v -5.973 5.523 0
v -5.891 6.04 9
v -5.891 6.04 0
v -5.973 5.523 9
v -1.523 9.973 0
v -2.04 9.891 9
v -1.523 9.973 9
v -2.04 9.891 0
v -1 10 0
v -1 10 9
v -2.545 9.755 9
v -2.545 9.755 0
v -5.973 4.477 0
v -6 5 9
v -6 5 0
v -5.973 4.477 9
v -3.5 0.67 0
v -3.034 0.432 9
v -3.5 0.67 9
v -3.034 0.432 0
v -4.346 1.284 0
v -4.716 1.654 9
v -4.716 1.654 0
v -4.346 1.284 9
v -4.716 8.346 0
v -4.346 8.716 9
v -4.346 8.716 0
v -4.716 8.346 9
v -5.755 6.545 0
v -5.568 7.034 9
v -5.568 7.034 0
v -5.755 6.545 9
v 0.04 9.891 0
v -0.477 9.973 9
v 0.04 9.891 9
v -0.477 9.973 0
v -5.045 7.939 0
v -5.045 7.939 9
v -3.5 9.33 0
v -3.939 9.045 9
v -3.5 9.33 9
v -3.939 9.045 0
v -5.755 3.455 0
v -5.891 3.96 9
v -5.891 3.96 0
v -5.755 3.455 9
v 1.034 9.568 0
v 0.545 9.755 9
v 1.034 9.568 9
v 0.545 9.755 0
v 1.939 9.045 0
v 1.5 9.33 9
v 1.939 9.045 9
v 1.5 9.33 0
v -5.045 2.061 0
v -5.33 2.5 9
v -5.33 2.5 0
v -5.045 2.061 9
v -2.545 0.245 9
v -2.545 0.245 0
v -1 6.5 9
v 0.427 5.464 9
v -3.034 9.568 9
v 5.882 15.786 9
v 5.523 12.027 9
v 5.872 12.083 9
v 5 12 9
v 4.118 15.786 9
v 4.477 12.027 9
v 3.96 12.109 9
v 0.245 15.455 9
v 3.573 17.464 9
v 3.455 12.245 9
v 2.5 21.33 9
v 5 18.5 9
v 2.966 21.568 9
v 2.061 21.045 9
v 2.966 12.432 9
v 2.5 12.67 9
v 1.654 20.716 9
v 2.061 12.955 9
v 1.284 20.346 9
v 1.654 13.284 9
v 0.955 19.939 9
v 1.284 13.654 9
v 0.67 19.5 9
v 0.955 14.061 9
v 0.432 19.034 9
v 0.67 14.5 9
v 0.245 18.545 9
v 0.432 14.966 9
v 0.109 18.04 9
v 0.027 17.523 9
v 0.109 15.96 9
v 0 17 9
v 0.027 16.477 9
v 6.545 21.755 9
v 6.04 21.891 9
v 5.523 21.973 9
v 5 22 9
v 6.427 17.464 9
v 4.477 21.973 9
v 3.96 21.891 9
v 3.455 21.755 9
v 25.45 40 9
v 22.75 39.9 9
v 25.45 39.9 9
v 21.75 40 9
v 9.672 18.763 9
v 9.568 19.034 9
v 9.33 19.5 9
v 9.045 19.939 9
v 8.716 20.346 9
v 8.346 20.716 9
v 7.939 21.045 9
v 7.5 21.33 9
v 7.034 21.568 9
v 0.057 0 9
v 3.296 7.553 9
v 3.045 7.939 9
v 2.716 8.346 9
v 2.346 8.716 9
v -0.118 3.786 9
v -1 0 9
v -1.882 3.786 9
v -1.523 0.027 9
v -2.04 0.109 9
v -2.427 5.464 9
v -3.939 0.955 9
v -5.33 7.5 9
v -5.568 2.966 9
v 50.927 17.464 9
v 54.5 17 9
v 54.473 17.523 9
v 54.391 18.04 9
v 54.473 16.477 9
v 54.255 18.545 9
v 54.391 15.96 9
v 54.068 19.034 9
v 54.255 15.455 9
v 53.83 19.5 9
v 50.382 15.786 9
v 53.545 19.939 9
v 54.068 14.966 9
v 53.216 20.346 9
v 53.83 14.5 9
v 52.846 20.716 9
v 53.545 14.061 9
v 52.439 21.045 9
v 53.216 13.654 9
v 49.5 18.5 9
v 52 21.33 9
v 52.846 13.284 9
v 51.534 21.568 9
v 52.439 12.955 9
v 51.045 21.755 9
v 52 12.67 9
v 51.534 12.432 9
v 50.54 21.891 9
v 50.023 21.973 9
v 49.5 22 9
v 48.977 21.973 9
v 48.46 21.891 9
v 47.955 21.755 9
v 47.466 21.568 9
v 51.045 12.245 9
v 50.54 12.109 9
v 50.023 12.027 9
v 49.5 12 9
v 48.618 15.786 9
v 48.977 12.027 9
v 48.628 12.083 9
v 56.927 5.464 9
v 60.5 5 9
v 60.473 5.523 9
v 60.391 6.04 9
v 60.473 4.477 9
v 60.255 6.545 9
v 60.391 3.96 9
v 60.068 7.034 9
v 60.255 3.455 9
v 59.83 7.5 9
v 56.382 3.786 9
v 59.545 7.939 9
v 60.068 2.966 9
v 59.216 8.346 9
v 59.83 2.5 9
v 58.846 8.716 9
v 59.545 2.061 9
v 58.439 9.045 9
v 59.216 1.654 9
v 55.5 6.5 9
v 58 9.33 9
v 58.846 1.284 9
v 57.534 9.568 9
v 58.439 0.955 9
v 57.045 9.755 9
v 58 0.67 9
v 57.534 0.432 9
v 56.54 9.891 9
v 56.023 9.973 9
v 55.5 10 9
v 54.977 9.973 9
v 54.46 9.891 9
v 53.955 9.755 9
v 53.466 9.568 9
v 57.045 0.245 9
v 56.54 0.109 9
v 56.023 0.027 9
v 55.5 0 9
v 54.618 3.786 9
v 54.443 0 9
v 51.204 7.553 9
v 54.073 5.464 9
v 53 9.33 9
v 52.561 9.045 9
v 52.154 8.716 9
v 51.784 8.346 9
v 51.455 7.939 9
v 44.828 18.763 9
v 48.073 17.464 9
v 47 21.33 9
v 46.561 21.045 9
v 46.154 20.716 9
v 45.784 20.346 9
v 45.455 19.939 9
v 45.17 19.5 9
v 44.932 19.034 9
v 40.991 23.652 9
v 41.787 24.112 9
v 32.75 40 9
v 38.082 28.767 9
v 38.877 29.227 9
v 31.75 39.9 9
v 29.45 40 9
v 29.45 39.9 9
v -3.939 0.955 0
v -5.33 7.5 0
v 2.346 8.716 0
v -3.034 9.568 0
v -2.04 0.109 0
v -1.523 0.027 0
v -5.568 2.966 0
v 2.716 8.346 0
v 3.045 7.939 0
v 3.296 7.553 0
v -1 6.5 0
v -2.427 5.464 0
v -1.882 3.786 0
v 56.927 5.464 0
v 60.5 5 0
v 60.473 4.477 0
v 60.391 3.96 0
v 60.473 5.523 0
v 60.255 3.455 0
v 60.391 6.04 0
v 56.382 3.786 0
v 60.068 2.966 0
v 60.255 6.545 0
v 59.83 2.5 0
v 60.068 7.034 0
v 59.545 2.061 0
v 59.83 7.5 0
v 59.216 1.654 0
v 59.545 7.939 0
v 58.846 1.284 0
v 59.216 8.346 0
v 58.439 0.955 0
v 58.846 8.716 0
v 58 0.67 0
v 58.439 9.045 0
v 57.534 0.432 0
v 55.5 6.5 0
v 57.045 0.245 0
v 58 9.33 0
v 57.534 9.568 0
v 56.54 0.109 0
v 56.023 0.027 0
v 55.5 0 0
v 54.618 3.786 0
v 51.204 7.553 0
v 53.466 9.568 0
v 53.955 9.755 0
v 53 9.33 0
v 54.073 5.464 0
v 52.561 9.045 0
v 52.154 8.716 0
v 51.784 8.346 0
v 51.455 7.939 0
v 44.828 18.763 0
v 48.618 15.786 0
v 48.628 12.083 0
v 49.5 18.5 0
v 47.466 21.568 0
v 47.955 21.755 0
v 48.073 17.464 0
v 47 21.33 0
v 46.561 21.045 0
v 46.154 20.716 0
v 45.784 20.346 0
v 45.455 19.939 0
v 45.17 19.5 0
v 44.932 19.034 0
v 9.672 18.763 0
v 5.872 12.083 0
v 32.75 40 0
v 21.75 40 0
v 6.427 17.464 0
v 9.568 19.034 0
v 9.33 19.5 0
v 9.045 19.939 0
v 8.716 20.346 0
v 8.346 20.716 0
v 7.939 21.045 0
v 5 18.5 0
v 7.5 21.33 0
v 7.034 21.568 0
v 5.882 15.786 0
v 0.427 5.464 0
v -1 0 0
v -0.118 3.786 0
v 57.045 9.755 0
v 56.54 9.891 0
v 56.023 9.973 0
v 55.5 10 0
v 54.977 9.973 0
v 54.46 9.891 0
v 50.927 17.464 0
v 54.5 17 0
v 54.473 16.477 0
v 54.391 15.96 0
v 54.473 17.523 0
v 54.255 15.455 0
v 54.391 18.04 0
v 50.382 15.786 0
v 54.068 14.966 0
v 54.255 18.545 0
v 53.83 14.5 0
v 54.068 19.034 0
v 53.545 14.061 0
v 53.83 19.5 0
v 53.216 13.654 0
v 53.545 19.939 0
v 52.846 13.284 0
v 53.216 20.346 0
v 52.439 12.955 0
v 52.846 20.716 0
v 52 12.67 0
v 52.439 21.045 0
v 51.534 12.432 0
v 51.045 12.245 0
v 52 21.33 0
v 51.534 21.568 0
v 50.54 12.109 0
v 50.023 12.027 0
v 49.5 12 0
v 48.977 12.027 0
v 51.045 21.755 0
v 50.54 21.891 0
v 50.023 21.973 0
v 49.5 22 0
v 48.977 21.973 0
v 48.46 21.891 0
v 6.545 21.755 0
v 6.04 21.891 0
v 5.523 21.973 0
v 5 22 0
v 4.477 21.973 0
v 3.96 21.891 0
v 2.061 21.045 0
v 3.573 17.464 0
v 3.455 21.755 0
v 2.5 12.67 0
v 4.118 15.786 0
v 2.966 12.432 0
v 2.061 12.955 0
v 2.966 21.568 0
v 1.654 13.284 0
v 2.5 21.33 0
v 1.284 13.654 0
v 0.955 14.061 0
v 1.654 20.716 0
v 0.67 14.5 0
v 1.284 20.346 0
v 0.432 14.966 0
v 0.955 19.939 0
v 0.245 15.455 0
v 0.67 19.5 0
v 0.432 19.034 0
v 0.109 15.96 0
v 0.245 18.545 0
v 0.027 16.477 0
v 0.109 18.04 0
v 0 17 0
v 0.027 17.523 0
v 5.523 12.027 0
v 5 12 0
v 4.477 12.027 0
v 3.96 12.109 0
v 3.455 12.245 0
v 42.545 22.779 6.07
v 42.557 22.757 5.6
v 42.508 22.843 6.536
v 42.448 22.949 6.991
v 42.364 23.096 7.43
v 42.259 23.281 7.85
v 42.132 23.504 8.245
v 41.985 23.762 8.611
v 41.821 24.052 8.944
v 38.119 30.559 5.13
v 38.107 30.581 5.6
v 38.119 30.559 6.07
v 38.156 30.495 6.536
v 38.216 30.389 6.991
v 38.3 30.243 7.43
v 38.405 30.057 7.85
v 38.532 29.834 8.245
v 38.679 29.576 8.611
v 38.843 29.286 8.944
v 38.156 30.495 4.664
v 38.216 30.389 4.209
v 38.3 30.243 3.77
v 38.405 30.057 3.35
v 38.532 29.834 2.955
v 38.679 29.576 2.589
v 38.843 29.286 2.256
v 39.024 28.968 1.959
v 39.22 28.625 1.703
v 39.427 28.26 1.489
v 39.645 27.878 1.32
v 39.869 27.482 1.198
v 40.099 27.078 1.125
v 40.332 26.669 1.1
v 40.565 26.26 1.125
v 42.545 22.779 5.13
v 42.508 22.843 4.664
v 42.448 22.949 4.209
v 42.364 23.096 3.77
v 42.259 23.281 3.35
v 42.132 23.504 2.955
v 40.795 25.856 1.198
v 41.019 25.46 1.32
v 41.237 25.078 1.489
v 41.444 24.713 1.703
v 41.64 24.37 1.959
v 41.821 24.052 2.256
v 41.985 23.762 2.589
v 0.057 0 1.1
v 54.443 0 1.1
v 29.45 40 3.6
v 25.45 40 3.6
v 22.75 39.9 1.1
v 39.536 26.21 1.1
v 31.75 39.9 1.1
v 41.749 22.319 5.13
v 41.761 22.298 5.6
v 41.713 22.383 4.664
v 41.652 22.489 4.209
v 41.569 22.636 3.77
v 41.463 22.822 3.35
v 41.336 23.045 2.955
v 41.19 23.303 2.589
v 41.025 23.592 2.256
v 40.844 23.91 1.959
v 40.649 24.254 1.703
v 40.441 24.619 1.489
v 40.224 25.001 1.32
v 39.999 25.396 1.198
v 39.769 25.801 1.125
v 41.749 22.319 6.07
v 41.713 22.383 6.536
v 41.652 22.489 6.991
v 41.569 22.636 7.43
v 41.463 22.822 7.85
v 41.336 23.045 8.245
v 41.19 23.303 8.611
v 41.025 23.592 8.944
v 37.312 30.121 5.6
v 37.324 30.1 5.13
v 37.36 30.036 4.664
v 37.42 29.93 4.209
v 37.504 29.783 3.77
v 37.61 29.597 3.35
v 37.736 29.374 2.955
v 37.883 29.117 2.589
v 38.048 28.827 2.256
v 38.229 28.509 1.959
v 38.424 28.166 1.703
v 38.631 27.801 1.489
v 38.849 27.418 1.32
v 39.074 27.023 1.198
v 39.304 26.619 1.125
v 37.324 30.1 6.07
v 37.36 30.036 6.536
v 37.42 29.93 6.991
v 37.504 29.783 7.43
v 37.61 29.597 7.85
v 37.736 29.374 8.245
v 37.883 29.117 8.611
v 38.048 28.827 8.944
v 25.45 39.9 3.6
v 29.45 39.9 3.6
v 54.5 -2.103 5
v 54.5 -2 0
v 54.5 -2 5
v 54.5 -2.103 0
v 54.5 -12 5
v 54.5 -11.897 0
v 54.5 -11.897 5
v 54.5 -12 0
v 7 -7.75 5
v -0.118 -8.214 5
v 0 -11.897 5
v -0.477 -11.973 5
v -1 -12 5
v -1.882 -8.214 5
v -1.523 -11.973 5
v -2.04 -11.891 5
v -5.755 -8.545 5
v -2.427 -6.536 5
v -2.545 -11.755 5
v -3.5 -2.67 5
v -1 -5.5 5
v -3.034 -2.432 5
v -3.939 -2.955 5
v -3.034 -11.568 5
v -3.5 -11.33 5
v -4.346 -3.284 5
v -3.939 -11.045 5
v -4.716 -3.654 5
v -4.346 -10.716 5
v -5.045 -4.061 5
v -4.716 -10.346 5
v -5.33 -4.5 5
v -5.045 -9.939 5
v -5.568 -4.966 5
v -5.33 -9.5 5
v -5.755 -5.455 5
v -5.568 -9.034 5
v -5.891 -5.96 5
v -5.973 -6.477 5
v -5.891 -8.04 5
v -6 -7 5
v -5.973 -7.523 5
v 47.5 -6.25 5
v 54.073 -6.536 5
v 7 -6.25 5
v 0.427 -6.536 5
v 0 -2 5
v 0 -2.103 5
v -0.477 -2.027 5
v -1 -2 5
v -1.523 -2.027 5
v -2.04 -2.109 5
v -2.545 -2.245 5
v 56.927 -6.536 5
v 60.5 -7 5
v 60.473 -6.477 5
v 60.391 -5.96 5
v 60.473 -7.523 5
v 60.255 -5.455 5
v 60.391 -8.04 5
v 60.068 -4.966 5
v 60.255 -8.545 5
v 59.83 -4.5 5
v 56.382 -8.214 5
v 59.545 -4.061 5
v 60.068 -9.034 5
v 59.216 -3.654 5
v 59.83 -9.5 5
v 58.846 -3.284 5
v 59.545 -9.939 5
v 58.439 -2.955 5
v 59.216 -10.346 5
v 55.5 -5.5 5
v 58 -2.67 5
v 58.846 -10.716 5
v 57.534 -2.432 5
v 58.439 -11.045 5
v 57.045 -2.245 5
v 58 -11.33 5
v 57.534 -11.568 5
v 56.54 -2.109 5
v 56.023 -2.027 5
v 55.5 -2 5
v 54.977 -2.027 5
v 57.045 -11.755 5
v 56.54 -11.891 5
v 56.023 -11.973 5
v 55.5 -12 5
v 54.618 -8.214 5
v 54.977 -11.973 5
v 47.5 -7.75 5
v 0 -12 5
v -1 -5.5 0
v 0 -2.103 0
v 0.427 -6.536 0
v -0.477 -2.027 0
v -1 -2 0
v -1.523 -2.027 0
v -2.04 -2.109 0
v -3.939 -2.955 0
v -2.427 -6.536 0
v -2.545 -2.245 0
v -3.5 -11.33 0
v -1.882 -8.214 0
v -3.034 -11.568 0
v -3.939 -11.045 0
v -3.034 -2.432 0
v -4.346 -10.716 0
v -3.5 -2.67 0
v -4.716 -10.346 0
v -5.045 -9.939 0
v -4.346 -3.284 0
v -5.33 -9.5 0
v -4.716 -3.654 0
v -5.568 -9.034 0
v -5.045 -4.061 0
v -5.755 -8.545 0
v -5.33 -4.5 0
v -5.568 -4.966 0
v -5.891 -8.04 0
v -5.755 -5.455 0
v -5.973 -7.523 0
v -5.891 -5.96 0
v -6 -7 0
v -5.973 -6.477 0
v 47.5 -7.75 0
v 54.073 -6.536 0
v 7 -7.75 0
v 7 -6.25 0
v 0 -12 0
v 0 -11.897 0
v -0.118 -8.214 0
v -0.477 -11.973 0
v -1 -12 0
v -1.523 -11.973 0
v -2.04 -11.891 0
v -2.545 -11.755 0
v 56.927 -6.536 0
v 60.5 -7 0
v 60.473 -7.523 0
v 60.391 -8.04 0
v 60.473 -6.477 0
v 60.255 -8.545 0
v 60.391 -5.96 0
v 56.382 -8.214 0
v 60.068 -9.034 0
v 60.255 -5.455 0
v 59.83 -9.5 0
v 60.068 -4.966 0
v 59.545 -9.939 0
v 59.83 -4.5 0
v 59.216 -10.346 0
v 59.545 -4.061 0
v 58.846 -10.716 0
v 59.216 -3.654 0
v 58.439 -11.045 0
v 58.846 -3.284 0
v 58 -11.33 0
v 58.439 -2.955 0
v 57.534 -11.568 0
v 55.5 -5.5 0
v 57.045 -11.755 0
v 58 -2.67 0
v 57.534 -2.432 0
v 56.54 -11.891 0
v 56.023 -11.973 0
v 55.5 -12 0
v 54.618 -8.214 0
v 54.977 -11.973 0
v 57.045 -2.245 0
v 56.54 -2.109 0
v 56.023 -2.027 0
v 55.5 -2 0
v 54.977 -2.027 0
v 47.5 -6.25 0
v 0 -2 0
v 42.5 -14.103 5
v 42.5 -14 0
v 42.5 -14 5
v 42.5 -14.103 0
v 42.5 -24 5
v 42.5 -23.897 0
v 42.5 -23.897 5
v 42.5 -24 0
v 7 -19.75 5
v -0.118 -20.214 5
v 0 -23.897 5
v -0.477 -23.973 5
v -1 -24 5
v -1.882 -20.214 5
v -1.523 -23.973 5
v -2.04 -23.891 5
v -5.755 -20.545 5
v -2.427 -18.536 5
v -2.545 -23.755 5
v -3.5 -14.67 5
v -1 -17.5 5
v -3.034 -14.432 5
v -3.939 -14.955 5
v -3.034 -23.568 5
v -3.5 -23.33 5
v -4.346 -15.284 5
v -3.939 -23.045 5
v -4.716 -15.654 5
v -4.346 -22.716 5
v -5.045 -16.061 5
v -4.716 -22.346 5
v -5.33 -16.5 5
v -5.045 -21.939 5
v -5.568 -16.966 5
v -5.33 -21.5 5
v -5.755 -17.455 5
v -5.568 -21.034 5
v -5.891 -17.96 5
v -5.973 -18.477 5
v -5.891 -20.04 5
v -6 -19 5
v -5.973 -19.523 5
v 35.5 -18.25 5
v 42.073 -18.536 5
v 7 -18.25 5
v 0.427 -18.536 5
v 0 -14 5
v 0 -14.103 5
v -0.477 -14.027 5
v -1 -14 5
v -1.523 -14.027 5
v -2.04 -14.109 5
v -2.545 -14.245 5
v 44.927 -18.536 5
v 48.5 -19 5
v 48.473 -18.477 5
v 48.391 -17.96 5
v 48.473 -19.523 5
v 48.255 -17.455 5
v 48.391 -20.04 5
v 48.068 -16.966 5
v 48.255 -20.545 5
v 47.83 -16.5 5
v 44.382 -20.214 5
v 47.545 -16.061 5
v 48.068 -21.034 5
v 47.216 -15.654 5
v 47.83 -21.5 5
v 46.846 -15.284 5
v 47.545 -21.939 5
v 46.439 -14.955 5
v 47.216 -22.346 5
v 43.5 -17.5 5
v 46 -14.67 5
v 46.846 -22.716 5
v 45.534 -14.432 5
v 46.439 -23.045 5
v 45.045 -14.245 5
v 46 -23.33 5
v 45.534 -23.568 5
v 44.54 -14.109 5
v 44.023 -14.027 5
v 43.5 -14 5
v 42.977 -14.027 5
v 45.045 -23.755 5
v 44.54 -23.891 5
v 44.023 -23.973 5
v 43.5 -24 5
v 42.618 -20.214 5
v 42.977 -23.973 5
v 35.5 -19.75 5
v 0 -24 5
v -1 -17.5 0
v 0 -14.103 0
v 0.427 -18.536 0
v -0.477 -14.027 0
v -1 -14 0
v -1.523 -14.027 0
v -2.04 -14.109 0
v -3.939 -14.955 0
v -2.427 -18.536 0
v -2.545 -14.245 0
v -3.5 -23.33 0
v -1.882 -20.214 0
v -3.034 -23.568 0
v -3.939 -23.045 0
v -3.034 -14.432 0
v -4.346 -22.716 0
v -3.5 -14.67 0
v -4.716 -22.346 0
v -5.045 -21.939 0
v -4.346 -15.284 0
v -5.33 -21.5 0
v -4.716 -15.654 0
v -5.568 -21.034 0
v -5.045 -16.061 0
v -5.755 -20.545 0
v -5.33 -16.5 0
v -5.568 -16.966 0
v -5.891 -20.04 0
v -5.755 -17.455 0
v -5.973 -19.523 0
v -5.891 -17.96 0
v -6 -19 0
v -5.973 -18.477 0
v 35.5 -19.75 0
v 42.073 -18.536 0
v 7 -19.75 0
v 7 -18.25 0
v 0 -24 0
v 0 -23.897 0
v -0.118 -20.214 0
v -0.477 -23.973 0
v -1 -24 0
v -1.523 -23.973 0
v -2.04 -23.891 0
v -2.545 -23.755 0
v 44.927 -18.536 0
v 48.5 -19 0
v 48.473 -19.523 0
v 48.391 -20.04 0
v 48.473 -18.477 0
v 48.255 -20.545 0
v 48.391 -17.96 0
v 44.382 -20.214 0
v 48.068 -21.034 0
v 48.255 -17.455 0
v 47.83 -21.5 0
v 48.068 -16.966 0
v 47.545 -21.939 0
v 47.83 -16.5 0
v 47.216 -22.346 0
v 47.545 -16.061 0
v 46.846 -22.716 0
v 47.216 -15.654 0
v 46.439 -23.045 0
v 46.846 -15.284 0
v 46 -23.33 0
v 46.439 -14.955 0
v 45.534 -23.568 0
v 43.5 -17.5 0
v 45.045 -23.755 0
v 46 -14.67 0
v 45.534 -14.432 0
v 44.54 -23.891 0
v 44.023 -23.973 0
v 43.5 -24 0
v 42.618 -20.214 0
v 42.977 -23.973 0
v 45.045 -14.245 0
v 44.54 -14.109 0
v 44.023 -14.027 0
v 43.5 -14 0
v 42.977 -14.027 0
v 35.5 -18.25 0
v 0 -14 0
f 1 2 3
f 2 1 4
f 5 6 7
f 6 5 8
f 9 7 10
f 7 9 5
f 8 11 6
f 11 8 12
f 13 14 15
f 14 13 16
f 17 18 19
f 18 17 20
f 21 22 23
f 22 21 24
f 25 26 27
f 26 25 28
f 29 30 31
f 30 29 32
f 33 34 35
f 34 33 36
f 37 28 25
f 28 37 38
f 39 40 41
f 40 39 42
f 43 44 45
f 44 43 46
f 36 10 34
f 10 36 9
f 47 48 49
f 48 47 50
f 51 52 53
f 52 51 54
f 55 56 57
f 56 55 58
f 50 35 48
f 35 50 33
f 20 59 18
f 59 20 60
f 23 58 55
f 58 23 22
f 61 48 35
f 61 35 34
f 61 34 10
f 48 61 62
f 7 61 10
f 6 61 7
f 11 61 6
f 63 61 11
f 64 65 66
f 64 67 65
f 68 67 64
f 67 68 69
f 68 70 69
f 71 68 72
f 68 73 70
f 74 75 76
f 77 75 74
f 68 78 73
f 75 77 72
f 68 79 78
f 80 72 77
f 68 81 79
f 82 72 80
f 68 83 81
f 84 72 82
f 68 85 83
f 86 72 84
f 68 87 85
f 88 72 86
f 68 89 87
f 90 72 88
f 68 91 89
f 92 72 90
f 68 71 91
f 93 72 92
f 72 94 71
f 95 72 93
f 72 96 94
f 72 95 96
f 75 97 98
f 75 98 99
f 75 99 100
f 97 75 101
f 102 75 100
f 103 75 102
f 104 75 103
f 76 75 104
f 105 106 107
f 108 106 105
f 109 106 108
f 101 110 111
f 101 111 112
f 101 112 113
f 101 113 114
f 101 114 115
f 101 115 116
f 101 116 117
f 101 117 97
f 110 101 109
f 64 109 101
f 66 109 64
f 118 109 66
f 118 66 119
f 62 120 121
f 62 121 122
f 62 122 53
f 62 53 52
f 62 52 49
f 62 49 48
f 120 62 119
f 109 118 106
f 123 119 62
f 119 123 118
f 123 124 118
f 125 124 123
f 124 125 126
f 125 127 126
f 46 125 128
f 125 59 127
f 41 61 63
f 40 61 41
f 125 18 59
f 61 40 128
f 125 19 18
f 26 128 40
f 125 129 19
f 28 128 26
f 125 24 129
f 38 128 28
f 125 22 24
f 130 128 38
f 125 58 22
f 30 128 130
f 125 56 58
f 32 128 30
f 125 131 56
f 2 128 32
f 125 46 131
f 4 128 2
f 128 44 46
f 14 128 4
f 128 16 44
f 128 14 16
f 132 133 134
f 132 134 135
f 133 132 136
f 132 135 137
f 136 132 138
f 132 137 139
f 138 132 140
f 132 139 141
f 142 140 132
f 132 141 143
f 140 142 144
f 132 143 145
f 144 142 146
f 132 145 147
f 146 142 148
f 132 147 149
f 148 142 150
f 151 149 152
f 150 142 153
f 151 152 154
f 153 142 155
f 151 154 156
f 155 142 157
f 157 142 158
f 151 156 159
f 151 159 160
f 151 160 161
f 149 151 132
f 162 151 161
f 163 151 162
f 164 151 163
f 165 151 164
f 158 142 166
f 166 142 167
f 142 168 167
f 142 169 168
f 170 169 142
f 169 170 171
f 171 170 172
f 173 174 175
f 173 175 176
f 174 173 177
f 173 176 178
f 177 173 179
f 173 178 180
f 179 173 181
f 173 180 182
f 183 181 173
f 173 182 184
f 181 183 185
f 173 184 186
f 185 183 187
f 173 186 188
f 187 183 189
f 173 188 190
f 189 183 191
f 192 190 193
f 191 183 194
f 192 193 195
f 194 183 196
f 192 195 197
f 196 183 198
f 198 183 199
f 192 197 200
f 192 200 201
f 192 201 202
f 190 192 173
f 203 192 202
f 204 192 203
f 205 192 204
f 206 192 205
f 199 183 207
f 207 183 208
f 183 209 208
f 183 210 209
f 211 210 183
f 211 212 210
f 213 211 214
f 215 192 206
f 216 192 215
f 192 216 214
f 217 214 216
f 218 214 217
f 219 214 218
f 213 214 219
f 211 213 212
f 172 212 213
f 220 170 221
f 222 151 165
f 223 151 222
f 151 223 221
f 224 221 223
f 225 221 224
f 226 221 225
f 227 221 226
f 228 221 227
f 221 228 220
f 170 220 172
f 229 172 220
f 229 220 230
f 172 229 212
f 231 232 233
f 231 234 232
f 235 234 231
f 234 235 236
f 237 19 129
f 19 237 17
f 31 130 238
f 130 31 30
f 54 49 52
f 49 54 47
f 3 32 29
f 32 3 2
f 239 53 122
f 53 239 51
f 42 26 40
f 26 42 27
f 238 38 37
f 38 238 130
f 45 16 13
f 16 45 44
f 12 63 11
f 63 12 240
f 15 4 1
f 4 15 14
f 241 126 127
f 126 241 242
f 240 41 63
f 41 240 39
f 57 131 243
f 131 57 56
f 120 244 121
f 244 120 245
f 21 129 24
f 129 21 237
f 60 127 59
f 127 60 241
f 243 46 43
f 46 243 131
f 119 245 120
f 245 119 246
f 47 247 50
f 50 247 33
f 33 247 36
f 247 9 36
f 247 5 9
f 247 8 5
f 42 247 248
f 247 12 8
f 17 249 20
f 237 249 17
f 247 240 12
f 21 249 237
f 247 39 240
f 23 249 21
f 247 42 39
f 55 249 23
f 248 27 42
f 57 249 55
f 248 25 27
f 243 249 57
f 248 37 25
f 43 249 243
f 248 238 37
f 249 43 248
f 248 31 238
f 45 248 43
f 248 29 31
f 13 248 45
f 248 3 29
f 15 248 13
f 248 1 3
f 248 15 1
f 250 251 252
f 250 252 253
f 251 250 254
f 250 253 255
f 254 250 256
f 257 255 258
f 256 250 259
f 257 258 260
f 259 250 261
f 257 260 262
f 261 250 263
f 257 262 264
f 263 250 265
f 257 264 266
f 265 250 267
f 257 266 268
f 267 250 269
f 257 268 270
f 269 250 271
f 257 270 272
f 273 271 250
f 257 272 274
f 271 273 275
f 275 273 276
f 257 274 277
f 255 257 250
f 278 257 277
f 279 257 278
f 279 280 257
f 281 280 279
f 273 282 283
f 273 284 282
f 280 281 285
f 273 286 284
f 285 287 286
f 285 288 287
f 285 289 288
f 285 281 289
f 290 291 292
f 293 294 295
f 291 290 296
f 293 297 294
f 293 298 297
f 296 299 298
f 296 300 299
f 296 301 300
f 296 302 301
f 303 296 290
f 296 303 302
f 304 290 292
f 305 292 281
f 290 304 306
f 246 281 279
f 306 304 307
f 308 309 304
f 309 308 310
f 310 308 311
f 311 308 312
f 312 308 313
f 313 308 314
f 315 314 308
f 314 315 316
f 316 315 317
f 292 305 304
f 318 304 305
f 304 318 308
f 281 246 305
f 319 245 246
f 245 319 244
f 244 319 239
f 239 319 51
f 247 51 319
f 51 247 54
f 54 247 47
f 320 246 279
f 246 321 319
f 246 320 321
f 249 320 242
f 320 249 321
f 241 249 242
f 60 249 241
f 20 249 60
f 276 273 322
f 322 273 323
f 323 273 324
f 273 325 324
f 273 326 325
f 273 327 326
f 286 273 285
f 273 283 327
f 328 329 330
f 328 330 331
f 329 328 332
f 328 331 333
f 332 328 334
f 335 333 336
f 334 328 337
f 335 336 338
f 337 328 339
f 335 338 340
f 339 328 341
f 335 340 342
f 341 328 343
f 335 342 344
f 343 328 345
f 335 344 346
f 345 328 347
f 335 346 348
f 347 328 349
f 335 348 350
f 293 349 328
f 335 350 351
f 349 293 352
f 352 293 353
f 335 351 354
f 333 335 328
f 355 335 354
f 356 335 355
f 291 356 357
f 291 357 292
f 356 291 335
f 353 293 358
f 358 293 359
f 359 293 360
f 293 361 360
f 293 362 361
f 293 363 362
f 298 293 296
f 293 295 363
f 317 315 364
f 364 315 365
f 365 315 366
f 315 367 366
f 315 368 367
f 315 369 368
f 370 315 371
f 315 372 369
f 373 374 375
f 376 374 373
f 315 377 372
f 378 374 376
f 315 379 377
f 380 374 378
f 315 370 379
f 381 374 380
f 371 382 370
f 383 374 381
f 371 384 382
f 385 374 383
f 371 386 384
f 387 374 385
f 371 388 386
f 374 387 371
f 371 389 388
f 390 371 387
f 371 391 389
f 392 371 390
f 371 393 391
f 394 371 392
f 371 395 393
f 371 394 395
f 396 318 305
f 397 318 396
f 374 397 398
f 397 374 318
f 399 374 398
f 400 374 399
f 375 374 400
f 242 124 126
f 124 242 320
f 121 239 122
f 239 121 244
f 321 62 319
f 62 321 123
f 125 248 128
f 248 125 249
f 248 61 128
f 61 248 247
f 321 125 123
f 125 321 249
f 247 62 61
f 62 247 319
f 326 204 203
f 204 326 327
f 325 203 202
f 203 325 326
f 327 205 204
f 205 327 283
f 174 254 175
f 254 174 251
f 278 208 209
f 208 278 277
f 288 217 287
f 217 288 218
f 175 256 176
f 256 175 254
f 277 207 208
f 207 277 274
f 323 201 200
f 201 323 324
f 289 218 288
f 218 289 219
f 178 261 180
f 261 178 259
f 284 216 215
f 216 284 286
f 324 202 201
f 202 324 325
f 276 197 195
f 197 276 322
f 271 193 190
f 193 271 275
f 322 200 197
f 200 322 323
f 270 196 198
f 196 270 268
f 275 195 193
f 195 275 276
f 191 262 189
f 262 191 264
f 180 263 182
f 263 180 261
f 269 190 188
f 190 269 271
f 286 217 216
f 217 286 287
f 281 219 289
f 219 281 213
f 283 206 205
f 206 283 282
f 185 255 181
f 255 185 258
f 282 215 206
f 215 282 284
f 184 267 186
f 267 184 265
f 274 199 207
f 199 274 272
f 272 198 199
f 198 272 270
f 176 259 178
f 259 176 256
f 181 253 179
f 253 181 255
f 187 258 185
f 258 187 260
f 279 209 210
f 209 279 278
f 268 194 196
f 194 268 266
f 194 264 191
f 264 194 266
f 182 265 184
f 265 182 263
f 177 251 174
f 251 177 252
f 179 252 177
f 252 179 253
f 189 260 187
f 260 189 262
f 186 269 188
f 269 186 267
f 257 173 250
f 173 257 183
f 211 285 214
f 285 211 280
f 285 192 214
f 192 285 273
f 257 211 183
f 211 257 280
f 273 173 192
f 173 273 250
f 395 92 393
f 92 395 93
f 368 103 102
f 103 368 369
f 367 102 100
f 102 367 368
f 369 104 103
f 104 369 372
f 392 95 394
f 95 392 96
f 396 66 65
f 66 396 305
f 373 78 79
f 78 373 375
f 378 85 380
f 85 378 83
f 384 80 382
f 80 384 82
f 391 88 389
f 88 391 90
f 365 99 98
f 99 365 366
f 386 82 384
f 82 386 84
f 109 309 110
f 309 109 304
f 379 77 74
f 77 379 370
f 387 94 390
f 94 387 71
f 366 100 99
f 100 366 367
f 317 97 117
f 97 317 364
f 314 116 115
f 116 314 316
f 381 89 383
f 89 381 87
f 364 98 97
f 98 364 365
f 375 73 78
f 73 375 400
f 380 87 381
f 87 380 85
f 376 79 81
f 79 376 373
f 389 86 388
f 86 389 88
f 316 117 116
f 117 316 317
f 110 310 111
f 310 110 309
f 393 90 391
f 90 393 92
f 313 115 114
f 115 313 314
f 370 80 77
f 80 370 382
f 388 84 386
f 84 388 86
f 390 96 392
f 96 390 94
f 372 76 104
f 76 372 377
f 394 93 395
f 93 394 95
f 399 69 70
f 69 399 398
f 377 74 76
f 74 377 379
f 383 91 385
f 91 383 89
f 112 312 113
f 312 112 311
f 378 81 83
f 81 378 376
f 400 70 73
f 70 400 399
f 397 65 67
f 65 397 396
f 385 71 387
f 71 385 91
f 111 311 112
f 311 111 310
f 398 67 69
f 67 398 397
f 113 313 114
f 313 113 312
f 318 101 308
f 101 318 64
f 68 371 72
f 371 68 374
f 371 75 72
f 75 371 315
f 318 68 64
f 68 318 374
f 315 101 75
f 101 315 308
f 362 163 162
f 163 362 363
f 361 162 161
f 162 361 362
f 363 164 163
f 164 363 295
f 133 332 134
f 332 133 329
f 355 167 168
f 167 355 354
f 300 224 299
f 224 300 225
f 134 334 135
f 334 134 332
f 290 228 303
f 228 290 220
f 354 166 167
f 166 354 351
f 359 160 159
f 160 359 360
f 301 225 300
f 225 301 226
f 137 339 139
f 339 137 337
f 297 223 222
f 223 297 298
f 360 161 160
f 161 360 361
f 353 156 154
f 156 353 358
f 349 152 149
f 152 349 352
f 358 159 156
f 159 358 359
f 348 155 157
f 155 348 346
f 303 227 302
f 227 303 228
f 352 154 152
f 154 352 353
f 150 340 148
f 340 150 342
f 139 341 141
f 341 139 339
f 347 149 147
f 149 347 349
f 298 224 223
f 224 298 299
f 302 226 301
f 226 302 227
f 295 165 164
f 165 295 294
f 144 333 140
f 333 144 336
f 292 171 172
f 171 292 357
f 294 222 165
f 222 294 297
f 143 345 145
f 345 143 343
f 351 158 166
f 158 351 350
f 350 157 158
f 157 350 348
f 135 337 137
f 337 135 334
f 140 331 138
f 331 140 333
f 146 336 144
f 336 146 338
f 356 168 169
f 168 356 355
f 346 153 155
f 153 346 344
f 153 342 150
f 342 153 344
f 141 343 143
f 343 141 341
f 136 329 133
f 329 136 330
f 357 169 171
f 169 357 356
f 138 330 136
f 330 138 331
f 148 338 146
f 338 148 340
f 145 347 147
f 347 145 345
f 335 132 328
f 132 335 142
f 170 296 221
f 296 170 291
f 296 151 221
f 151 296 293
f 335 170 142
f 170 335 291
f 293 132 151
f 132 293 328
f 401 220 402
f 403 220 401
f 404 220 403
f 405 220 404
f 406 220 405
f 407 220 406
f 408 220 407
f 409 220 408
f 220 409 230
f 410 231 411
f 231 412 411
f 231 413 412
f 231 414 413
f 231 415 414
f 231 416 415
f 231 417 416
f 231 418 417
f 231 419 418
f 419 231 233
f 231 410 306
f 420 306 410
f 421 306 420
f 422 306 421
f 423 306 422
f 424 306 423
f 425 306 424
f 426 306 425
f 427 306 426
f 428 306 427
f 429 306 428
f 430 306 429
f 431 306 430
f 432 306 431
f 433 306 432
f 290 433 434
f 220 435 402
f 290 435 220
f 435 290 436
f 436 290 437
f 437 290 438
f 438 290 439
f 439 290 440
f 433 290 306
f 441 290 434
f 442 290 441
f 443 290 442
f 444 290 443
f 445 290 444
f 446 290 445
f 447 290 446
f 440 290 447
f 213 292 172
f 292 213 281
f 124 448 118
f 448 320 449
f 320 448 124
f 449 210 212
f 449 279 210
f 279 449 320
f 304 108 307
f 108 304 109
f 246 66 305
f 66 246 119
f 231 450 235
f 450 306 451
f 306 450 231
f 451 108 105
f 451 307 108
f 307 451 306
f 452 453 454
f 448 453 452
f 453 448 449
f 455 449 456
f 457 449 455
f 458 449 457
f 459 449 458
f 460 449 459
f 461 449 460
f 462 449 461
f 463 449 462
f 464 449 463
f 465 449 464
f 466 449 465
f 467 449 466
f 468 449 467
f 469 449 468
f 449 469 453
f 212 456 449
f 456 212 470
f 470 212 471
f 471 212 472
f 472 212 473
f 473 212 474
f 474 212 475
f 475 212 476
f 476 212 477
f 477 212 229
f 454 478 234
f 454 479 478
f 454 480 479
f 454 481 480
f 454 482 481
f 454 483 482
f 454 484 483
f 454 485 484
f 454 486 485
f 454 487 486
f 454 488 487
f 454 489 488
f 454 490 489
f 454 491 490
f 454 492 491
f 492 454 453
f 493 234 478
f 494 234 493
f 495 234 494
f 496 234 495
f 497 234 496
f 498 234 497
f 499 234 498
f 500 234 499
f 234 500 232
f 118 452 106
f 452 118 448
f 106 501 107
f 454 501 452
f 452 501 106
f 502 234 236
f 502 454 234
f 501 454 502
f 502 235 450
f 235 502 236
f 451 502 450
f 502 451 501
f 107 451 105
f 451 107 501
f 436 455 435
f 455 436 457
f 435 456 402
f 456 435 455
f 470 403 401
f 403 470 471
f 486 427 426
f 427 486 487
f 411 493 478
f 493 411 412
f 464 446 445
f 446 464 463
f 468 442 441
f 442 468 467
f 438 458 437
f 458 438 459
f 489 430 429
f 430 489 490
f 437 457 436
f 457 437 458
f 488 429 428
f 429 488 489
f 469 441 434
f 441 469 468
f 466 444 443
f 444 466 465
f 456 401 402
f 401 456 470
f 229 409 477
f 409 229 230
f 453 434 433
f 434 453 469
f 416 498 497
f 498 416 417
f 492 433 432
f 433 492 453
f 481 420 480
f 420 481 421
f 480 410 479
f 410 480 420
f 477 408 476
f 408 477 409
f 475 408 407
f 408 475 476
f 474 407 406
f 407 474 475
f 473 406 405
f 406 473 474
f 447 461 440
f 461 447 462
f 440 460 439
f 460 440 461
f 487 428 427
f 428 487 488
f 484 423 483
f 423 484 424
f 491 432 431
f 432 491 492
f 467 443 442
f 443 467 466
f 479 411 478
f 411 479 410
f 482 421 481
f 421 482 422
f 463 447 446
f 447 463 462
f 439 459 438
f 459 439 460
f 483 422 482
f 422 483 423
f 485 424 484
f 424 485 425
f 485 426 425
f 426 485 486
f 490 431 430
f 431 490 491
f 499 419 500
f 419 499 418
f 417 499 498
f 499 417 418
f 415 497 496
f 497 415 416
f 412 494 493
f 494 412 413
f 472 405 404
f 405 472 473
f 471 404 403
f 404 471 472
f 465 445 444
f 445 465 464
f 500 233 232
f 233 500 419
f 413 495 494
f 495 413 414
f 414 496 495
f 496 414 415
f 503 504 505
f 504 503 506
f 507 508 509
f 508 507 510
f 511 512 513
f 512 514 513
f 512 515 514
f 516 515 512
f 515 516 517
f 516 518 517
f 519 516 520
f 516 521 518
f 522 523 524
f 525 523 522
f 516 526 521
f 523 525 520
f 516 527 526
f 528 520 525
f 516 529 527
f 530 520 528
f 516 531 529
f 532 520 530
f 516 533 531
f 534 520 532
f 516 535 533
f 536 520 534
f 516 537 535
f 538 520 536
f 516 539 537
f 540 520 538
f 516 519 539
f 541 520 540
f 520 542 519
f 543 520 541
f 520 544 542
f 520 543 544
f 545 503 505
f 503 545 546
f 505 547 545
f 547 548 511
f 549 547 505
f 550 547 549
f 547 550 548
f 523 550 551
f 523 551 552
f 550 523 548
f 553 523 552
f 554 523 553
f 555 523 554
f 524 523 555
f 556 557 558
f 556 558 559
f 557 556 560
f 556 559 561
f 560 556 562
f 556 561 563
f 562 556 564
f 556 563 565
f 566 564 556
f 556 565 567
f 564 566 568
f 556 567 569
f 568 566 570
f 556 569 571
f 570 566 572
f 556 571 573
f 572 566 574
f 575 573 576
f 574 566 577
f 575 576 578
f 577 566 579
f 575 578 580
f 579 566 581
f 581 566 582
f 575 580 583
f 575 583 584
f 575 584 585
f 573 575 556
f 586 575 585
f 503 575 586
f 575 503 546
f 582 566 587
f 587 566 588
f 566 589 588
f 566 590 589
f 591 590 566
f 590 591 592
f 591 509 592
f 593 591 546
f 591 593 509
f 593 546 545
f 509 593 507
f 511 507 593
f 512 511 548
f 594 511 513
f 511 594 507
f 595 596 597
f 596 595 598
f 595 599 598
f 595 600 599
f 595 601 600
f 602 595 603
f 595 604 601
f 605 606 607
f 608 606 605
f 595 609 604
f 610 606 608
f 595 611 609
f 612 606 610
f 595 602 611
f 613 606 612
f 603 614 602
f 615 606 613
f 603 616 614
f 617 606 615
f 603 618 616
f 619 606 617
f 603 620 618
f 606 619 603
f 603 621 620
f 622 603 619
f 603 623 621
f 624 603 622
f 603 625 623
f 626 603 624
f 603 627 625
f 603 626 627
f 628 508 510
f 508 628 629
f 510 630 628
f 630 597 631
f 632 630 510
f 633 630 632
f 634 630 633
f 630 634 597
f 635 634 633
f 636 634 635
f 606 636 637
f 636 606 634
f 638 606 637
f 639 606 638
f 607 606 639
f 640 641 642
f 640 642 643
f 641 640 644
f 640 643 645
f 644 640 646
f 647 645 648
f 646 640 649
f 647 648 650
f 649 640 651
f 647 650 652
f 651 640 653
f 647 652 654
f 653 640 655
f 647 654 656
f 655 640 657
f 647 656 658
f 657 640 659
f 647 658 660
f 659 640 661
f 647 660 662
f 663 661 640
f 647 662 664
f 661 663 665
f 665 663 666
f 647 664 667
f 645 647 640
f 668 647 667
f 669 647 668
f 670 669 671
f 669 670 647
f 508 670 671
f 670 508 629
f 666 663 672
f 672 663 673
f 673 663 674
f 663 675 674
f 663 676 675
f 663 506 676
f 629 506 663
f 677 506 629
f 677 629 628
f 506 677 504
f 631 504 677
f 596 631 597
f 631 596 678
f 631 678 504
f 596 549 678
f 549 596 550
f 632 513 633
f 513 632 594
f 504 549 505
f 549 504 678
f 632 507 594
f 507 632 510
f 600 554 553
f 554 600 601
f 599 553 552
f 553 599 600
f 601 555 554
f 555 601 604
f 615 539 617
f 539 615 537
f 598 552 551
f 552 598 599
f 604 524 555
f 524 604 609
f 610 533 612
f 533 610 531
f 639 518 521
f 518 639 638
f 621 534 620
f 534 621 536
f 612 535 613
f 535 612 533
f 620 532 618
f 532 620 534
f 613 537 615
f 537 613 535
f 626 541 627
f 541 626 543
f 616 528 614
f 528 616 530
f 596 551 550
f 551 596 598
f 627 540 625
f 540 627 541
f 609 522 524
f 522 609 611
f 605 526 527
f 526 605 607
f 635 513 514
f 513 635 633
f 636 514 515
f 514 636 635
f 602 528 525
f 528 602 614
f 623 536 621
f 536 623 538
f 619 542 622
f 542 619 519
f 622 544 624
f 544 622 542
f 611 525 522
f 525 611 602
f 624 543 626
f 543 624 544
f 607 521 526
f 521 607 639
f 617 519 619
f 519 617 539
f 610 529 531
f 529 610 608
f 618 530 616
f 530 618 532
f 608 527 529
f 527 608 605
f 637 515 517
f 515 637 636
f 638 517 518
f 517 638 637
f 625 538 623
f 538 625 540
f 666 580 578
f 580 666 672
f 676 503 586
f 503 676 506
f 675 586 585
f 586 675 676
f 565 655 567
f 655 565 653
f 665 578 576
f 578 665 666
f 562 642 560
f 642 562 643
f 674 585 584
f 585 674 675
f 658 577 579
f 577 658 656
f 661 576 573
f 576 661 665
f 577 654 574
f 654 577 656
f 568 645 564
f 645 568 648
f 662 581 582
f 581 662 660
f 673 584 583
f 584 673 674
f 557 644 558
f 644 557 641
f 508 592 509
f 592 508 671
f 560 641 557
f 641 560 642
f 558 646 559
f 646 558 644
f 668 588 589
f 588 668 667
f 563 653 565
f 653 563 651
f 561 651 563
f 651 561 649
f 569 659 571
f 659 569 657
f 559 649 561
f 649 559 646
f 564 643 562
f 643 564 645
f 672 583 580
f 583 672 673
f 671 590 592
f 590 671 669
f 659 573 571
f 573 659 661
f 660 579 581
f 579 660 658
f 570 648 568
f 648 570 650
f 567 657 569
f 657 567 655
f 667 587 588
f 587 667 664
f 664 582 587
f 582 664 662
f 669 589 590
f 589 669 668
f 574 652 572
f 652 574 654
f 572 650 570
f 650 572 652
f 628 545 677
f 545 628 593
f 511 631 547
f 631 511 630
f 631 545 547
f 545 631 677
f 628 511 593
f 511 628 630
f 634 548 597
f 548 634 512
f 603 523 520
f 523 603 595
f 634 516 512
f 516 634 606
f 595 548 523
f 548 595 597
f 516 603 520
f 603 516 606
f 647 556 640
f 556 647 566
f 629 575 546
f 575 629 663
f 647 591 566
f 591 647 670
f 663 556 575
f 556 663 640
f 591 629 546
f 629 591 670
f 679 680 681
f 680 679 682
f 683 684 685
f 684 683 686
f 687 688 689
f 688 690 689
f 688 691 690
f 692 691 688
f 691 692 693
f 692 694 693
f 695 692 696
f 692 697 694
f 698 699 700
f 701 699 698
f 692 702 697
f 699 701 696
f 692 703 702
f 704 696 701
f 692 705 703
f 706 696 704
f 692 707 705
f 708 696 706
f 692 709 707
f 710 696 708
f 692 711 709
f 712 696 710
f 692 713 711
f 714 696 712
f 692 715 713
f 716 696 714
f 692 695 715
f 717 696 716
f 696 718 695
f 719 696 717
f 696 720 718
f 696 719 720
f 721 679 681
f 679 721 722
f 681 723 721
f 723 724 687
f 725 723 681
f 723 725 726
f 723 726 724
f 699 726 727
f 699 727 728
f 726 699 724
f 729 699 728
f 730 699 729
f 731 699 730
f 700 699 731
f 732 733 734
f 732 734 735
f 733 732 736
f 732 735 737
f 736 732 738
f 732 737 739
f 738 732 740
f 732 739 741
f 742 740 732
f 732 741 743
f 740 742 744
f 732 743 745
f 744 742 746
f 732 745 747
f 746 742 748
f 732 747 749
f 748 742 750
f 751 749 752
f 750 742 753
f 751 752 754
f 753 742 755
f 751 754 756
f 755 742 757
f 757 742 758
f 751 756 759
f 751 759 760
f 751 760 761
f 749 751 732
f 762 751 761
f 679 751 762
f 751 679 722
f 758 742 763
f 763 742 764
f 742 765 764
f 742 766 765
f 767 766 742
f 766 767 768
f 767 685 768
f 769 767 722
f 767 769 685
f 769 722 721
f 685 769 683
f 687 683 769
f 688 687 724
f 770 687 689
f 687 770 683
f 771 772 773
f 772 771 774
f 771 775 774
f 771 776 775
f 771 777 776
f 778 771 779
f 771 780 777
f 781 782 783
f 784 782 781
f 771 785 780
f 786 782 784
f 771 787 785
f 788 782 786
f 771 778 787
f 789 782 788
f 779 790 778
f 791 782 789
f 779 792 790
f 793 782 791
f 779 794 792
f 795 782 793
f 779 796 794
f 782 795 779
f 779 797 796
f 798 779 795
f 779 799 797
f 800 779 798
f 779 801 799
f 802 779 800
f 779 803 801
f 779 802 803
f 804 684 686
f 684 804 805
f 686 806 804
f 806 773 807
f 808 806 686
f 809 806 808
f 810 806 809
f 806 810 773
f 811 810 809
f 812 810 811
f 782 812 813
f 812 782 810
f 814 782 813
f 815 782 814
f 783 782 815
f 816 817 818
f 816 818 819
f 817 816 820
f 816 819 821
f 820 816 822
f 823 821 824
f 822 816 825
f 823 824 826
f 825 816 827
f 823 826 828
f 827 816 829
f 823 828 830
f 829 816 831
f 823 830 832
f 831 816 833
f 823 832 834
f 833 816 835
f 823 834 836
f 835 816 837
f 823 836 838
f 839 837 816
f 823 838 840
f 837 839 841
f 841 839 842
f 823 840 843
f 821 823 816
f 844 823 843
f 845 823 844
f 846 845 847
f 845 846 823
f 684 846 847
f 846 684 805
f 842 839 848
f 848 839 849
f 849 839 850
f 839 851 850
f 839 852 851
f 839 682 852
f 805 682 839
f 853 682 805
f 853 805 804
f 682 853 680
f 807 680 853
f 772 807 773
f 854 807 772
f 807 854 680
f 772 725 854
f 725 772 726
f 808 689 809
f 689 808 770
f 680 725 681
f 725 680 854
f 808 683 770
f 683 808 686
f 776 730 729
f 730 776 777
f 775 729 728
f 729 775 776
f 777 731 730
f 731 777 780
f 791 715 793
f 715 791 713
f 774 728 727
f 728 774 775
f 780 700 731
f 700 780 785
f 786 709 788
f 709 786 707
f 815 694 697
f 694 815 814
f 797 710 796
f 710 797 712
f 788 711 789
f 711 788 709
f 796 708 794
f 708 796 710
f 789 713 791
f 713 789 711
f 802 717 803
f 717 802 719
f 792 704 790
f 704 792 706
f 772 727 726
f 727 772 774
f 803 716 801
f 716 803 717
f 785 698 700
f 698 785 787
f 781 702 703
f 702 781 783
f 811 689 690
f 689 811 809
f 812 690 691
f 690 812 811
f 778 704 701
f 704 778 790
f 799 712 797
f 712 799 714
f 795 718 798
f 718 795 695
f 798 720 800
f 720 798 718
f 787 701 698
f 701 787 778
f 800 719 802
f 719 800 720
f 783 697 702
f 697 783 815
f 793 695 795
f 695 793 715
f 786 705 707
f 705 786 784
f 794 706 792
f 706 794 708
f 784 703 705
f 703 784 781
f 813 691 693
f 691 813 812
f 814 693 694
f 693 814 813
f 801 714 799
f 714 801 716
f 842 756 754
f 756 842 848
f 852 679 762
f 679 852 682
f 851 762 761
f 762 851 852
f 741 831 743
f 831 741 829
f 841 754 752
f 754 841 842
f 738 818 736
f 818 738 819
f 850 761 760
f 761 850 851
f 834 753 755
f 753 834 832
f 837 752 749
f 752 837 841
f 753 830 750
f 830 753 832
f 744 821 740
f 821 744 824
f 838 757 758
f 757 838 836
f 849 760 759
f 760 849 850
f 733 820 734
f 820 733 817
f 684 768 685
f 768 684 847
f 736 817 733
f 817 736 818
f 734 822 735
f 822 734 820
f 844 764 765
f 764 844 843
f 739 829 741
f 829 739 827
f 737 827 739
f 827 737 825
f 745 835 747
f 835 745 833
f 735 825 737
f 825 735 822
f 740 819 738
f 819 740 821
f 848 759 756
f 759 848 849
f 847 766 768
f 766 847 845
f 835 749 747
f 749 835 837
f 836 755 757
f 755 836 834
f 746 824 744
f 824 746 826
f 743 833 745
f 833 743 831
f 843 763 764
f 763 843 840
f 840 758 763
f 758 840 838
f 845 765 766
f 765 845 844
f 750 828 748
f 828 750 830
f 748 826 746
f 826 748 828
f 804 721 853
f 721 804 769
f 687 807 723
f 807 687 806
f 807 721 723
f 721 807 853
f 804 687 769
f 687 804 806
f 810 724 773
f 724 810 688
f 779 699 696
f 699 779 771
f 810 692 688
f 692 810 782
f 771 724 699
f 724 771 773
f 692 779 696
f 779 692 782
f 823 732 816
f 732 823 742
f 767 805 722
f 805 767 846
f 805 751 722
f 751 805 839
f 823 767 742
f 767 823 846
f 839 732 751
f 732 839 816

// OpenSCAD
include <inc/rack_item.scad>

//cableTie();

//usb2sata();

//usb2sataCase();
connector_test(zOffset=1);
//floor(drive=true, power=false, board=false);
//floor(drive=false, power=true, board=false);
//floor(drive=false, power=false, board=true);

//part(left=false);
//part(left=true);
